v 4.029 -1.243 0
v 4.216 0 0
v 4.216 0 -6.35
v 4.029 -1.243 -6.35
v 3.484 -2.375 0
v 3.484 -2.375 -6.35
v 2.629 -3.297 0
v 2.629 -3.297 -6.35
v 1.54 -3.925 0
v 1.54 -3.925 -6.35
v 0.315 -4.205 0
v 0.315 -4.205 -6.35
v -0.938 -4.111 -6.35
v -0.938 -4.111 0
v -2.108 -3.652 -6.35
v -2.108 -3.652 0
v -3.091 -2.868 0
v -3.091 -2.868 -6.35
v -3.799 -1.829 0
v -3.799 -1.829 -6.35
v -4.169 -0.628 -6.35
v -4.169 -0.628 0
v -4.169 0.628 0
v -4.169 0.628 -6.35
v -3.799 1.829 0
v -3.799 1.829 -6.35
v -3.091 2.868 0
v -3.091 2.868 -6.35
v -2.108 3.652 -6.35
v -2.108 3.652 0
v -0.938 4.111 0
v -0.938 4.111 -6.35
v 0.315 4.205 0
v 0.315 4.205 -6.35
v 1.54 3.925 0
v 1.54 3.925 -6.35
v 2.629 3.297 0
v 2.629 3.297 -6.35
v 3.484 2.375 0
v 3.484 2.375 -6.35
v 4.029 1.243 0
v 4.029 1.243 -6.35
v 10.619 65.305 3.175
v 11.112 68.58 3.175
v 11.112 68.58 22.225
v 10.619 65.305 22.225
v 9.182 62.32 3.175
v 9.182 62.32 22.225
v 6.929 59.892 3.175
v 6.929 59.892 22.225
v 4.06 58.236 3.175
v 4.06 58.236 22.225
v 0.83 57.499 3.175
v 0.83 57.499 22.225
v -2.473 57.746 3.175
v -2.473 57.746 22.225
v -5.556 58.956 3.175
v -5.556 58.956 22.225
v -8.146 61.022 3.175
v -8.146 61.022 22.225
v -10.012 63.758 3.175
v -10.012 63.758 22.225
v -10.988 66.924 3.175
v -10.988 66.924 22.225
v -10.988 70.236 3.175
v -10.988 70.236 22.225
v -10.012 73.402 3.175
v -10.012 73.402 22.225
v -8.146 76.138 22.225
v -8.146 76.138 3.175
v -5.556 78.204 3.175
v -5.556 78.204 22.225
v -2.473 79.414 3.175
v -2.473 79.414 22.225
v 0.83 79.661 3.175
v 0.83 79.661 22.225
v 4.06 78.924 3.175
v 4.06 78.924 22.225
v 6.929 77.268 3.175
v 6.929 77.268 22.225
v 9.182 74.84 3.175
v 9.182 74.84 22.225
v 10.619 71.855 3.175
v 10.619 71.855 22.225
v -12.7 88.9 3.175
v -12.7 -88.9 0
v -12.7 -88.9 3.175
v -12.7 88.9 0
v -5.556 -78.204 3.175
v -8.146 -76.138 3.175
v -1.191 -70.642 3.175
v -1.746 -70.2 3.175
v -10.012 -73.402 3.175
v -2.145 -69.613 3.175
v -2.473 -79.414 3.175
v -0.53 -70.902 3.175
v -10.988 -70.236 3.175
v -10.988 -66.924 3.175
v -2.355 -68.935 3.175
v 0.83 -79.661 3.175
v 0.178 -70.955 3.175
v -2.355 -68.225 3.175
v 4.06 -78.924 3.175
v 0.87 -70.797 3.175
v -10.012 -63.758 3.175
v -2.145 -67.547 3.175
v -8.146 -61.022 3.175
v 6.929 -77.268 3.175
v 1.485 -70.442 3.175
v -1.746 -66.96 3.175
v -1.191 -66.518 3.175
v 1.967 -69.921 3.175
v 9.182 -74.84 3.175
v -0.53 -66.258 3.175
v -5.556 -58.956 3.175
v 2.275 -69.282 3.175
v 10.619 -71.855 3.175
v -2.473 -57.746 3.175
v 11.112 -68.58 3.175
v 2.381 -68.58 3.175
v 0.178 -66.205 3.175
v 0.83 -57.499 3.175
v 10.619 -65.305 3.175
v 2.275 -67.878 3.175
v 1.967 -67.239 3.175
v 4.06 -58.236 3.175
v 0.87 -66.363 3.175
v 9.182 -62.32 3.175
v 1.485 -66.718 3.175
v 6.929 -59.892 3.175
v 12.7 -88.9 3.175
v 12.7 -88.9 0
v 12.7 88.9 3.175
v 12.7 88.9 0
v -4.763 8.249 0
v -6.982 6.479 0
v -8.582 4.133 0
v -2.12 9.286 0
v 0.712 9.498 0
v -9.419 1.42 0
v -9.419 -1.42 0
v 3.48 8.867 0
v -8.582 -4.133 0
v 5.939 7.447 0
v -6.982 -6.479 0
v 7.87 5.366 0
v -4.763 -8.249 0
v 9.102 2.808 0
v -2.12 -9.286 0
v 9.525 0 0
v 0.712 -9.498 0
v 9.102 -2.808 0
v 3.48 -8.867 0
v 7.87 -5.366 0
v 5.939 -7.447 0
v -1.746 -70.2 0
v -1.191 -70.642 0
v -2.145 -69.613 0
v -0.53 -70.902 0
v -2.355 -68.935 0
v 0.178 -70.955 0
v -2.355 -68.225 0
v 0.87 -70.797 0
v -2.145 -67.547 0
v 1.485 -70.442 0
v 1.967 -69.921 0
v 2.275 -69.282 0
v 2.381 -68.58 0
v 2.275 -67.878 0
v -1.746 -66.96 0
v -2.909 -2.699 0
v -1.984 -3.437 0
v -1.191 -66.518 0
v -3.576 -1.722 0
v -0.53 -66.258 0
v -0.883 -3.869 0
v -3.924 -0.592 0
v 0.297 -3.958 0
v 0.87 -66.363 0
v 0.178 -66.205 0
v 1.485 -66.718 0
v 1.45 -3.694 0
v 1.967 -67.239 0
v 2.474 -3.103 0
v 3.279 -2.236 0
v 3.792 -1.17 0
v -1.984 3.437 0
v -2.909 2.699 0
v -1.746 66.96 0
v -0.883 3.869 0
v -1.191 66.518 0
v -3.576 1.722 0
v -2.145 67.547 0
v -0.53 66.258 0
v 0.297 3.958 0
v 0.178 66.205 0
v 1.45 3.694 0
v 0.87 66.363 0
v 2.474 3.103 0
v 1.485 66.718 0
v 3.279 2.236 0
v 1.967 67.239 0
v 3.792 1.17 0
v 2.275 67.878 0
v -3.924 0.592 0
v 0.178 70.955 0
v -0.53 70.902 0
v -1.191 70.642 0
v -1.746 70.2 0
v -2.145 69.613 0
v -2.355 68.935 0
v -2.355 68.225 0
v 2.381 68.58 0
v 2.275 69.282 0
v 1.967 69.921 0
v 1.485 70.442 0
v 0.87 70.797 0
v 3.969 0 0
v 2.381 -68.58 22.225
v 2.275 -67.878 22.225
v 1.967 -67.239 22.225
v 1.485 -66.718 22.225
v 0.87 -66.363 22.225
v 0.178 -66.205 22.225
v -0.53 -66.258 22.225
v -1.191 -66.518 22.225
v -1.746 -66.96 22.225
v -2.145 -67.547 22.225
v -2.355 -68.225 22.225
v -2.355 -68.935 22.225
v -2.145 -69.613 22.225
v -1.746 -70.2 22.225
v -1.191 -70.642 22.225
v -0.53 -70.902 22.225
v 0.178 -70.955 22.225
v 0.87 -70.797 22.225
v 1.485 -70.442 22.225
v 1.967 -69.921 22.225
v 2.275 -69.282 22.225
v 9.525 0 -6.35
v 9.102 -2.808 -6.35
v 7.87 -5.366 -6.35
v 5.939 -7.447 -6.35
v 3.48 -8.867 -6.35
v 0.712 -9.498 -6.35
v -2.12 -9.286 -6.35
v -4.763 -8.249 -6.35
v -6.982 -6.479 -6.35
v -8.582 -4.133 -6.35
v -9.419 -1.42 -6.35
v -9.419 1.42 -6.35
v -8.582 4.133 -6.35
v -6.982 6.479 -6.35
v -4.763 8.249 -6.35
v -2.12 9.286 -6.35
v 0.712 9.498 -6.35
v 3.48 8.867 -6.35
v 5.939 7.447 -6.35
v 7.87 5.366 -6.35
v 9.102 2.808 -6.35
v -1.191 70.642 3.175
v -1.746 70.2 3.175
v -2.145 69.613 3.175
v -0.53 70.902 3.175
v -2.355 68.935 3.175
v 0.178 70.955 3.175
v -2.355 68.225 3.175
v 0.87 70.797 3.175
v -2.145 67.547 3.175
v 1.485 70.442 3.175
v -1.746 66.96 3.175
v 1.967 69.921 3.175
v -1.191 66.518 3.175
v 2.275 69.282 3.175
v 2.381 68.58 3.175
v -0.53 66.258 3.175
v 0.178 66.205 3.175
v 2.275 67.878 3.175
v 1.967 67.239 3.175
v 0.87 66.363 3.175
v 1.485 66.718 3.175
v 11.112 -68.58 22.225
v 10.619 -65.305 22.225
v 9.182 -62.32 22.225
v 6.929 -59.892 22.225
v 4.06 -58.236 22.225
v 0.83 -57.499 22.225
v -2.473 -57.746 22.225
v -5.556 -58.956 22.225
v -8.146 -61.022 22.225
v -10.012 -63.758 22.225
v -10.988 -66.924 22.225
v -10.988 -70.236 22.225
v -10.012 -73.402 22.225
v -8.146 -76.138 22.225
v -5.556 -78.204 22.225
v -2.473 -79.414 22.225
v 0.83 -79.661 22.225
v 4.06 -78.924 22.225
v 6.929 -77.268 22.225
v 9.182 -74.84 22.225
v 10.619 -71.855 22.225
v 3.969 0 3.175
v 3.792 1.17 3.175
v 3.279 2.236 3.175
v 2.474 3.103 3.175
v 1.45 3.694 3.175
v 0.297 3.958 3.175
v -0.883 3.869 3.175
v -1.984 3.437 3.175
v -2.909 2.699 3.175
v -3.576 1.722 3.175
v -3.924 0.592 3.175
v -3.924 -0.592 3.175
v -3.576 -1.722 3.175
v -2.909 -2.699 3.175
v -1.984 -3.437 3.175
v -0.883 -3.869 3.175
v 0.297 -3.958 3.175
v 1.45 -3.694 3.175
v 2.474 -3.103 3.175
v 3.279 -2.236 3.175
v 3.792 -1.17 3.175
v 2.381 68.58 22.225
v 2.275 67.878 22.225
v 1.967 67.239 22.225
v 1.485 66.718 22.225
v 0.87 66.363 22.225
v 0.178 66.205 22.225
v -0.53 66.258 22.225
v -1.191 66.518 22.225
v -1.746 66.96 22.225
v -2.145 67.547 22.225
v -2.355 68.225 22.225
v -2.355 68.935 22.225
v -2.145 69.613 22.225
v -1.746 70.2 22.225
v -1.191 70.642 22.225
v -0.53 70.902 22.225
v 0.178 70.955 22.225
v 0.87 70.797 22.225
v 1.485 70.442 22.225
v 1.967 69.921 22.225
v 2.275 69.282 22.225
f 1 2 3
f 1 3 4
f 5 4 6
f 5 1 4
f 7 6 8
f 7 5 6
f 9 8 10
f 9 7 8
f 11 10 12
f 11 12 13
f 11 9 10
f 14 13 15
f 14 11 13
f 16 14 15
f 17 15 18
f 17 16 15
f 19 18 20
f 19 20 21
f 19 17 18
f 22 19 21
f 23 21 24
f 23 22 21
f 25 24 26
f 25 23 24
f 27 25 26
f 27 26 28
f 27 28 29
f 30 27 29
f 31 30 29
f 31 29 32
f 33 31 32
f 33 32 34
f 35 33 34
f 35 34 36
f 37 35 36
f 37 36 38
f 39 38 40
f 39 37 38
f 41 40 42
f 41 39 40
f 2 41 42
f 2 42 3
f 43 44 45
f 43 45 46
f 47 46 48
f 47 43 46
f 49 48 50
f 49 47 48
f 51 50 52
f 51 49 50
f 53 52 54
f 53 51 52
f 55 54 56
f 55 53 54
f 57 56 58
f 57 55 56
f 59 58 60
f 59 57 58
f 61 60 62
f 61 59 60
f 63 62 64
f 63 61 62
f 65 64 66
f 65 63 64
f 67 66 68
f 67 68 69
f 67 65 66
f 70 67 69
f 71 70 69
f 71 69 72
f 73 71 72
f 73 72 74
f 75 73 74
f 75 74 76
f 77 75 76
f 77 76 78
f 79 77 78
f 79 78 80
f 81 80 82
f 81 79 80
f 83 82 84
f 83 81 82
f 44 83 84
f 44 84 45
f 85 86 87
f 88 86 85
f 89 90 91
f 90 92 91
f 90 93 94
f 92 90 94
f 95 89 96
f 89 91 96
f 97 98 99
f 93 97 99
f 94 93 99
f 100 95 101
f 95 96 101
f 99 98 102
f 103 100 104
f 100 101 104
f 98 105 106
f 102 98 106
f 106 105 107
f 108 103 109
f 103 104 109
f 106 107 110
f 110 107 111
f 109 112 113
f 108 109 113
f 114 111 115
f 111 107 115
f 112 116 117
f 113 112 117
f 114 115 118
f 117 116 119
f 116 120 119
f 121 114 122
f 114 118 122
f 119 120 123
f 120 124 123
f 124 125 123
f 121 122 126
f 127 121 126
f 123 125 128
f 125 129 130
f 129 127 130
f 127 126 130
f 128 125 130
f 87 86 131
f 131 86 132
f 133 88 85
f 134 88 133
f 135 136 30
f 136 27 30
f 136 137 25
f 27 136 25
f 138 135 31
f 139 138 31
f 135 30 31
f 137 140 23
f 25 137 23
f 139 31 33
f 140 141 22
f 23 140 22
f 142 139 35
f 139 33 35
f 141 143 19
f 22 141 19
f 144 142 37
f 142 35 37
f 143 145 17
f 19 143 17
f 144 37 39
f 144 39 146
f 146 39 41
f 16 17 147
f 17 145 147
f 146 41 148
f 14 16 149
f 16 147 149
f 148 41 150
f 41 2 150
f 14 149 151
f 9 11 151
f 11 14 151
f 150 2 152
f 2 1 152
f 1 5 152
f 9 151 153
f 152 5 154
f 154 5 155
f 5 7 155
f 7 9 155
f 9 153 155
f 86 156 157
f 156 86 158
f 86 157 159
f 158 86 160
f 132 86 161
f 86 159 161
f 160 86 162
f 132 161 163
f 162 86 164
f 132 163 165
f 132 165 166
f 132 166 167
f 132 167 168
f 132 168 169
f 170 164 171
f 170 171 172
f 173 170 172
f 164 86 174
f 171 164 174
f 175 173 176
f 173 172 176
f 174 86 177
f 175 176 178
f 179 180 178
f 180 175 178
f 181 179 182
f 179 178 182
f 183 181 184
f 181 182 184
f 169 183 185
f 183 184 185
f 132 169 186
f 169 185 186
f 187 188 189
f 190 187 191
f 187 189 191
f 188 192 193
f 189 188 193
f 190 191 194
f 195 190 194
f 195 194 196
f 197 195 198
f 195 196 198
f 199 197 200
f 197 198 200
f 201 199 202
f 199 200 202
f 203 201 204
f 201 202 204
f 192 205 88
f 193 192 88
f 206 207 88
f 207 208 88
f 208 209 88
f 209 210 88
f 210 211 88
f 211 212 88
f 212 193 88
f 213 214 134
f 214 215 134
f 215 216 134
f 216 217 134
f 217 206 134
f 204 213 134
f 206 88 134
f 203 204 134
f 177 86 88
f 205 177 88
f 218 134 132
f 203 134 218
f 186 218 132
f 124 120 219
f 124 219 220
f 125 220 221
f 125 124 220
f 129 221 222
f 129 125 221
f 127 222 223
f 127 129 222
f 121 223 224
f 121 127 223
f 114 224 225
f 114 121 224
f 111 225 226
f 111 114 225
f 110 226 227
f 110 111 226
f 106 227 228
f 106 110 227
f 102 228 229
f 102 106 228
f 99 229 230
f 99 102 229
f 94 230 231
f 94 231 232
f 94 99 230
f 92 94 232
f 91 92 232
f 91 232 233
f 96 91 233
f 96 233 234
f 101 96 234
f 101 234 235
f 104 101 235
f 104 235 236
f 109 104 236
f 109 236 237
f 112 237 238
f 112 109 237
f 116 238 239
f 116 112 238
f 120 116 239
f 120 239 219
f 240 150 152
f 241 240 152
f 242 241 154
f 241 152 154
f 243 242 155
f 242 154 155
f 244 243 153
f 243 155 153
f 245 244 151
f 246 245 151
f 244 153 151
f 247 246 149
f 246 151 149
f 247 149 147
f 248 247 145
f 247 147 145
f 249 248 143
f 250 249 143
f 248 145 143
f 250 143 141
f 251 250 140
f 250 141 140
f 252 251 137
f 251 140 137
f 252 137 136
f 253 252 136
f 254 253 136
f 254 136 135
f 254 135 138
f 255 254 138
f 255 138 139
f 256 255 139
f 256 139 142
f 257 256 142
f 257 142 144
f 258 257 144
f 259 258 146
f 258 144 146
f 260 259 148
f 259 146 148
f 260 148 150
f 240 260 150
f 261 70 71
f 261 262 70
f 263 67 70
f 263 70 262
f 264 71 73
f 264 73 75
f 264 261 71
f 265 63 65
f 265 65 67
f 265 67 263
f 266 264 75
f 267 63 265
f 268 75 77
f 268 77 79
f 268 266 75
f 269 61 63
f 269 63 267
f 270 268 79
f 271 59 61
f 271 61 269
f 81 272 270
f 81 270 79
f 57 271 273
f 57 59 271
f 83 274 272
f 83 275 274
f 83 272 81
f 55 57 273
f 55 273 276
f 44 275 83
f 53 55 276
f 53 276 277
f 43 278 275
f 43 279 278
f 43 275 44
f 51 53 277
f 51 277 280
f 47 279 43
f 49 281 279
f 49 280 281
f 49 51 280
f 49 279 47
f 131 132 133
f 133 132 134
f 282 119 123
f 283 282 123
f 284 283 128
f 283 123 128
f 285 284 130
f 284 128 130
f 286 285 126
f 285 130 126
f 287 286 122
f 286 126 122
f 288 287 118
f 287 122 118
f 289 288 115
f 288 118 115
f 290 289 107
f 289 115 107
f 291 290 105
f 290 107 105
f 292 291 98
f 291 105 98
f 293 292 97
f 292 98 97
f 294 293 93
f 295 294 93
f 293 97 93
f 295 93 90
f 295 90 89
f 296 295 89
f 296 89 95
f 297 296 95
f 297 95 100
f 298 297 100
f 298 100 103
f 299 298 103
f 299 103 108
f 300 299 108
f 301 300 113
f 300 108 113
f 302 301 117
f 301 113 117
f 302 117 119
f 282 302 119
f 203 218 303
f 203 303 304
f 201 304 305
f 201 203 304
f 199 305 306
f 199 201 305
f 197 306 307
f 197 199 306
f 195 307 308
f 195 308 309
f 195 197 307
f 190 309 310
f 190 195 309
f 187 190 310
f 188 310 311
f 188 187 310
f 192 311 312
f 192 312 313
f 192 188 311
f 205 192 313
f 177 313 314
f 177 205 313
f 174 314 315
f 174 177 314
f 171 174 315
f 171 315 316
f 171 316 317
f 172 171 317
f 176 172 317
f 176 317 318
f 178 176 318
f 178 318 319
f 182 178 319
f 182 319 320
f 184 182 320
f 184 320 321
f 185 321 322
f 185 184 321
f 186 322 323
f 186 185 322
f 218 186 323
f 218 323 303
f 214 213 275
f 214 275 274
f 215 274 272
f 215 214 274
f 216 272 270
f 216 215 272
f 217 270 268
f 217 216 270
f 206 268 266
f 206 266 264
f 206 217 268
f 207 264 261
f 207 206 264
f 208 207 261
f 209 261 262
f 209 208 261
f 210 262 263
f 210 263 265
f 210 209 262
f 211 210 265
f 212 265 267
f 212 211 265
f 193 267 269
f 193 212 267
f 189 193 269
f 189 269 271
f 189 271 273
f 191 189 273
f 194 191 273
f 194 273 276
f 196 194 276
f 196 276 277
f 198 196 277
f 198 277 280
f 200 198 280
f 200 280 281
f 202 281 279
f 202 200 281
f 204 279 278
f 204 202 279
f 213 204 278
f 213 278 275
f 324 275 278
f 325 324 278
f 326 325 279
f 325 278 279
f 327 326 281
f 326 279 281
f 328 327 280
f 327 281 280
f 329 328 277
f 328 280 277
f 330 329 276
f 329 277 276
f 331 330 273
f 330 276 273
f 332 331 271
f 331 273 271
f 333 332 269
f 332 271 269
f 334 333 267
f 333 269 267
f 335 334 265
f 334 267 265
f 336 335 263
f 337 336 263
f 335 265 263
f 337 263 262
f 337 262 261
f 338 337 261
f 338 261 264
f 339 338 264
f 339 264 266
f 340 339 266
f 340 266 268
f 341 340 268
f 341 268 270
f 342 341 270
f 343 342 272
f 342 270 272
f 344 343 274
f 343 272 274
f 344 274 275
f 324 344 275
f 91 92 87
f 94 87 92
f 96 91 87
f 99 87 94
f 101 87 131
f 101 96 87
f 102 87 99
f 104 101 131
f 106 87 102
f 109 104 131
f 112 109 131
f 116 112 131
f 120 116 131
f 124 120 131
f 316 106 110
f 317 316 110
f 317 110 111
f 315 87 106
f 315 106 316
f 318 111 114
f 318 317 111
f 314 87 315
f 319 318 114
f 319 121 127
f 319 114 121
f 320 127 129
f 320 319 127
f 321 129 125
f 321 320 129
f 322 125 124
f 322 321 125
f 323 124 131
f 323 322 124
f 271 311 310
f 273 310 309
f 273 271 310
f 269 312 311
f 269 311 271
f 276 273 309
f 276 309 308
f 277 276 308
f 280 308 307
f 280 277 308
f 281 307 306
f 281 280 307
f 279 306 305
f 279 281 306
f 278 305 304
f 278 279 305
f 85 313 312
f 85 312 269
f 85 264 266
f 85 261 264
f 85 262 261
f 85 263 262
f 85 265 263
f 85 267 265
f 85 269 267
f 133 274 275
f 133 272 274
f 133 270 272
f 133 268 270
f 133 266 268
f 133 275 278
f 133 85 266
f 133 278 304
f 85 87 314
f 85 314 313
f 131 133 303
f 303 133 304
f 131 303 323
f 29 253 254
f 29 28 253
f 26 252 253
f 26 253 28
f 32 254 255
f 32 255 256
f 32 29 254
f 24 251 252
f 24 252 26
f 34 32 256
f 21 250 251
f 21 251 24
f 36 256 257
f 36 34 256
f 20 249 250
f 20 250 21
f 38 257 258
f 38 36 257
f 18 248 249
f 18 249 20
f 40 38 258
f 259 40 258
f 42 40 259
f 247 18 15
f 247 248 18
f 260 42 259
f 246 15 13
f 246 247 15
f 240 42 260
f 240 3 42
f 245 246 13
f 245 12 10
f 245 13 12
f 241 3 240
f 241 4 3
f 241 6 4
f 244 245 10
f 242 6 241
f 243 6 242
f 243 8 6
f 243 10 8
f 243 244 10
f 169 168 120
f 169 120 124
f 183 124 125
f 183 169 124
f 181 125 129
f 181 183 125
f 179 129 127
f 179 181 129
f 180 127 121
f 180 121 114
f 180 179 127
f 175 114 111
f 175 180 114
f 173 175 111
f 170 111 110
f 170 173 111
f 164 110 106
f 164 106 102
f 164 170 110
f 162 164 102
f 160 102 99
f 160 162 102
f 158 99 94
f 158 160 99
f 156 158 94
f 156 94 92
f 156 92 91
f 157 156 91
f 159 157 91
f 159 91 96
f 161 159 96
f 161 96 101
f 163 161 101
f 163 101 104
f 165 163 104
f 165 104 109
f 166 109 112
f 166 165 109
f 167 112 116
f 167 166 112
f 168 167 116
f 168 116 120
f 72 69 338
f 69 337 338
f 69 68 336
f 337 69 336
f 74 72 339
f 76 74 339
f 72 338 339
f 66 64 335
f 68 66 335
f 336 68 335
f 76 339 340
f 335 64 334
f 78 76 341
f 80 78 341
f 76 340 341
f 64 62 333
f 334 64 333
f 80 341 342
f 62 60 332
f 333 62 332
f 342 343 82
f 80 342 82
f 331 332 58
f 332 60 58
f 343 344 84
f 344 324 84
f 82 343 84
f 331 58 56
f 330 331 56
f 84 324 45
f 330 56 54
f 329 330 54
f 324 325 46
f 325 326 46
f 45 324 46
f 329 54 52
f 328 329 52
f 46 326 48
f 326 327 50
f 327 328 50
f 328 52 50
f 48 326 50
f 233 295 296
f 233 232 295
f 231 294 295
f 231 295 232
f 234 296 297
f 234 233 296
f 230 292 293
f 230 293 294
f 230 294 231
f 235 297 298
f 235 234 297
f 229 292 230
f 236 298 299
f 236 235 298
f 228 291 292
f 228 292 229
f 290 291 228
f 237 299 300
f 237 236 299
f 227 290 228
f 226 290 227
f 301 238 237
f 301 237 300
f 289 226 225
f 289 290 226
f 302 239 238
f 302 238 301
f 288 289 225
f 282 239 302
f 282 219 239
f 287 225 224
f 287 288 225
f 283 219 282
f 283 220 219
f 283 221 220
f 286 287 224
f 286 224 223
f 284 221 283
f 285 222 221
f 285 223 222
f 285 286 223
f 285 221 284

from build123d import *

# Parameters (mm, degrees)
F0_W     = 25.4
F0_H     = 177.8
F0_R     = 2.38125
F0_R_2   = 3.96875
F1_DEPTH = 3.175
F2_R     = 9.525
F2_R_2   = 4.2164
F3_DEPTH = 6.35
F4_R     = 11.1125
F4_R_2   = 2.38125
F5_DEPTH = 19.05


with BuildPart() as f1:
    # F0 (on Top) → F1 (new body)
    with BuildSketch(Plane.XY):
        Rectangle(F0_W, F0_H)
        with Locations((0, -68.58)):
            Circle(F0_R, mode=Mode.SUBTRACT)
        Circle(F0_R_2, mode=Mode.SUBTRACT)
        with Locations((0, 68.58)):
            Circle(F0_R, mode=Mode.SUBTRACT)
    extrude(amount=F1_DEPTH)


with BuildPart() as f3:
    # F2 (on face) → F3 (new body)
    with BuildSketch(Plane(origin=(0, 0, 0), x_dir=(1, 0, 0), z_dir=(0, 0, -1))):
        Circle(F2_R)
        Circle(F2_R_2, mode=Mode.SUBTRACT)
    extrude(amount=F3_DEPTH)


with BuildPart() as f5:
    # F4 (on face) → F5 (new body)
    with BuildSketch(Plane.XY.offset(3.175)):
        with Locations((0, -68.58)):
            Circle(F4_R)
        with Locations((0, -68.58)):
            Circle(F4_R_2, mode=Mode.SUBTRACT)
    extrude(amount=F5_DEPTH)


with BuildPart() as f6_1:
    # F6: instance of F5
    add(f5.part.mirror(Plane.XZ))


solid = Compound([f1.part, f3.part, f5.part, f6_1.part])
